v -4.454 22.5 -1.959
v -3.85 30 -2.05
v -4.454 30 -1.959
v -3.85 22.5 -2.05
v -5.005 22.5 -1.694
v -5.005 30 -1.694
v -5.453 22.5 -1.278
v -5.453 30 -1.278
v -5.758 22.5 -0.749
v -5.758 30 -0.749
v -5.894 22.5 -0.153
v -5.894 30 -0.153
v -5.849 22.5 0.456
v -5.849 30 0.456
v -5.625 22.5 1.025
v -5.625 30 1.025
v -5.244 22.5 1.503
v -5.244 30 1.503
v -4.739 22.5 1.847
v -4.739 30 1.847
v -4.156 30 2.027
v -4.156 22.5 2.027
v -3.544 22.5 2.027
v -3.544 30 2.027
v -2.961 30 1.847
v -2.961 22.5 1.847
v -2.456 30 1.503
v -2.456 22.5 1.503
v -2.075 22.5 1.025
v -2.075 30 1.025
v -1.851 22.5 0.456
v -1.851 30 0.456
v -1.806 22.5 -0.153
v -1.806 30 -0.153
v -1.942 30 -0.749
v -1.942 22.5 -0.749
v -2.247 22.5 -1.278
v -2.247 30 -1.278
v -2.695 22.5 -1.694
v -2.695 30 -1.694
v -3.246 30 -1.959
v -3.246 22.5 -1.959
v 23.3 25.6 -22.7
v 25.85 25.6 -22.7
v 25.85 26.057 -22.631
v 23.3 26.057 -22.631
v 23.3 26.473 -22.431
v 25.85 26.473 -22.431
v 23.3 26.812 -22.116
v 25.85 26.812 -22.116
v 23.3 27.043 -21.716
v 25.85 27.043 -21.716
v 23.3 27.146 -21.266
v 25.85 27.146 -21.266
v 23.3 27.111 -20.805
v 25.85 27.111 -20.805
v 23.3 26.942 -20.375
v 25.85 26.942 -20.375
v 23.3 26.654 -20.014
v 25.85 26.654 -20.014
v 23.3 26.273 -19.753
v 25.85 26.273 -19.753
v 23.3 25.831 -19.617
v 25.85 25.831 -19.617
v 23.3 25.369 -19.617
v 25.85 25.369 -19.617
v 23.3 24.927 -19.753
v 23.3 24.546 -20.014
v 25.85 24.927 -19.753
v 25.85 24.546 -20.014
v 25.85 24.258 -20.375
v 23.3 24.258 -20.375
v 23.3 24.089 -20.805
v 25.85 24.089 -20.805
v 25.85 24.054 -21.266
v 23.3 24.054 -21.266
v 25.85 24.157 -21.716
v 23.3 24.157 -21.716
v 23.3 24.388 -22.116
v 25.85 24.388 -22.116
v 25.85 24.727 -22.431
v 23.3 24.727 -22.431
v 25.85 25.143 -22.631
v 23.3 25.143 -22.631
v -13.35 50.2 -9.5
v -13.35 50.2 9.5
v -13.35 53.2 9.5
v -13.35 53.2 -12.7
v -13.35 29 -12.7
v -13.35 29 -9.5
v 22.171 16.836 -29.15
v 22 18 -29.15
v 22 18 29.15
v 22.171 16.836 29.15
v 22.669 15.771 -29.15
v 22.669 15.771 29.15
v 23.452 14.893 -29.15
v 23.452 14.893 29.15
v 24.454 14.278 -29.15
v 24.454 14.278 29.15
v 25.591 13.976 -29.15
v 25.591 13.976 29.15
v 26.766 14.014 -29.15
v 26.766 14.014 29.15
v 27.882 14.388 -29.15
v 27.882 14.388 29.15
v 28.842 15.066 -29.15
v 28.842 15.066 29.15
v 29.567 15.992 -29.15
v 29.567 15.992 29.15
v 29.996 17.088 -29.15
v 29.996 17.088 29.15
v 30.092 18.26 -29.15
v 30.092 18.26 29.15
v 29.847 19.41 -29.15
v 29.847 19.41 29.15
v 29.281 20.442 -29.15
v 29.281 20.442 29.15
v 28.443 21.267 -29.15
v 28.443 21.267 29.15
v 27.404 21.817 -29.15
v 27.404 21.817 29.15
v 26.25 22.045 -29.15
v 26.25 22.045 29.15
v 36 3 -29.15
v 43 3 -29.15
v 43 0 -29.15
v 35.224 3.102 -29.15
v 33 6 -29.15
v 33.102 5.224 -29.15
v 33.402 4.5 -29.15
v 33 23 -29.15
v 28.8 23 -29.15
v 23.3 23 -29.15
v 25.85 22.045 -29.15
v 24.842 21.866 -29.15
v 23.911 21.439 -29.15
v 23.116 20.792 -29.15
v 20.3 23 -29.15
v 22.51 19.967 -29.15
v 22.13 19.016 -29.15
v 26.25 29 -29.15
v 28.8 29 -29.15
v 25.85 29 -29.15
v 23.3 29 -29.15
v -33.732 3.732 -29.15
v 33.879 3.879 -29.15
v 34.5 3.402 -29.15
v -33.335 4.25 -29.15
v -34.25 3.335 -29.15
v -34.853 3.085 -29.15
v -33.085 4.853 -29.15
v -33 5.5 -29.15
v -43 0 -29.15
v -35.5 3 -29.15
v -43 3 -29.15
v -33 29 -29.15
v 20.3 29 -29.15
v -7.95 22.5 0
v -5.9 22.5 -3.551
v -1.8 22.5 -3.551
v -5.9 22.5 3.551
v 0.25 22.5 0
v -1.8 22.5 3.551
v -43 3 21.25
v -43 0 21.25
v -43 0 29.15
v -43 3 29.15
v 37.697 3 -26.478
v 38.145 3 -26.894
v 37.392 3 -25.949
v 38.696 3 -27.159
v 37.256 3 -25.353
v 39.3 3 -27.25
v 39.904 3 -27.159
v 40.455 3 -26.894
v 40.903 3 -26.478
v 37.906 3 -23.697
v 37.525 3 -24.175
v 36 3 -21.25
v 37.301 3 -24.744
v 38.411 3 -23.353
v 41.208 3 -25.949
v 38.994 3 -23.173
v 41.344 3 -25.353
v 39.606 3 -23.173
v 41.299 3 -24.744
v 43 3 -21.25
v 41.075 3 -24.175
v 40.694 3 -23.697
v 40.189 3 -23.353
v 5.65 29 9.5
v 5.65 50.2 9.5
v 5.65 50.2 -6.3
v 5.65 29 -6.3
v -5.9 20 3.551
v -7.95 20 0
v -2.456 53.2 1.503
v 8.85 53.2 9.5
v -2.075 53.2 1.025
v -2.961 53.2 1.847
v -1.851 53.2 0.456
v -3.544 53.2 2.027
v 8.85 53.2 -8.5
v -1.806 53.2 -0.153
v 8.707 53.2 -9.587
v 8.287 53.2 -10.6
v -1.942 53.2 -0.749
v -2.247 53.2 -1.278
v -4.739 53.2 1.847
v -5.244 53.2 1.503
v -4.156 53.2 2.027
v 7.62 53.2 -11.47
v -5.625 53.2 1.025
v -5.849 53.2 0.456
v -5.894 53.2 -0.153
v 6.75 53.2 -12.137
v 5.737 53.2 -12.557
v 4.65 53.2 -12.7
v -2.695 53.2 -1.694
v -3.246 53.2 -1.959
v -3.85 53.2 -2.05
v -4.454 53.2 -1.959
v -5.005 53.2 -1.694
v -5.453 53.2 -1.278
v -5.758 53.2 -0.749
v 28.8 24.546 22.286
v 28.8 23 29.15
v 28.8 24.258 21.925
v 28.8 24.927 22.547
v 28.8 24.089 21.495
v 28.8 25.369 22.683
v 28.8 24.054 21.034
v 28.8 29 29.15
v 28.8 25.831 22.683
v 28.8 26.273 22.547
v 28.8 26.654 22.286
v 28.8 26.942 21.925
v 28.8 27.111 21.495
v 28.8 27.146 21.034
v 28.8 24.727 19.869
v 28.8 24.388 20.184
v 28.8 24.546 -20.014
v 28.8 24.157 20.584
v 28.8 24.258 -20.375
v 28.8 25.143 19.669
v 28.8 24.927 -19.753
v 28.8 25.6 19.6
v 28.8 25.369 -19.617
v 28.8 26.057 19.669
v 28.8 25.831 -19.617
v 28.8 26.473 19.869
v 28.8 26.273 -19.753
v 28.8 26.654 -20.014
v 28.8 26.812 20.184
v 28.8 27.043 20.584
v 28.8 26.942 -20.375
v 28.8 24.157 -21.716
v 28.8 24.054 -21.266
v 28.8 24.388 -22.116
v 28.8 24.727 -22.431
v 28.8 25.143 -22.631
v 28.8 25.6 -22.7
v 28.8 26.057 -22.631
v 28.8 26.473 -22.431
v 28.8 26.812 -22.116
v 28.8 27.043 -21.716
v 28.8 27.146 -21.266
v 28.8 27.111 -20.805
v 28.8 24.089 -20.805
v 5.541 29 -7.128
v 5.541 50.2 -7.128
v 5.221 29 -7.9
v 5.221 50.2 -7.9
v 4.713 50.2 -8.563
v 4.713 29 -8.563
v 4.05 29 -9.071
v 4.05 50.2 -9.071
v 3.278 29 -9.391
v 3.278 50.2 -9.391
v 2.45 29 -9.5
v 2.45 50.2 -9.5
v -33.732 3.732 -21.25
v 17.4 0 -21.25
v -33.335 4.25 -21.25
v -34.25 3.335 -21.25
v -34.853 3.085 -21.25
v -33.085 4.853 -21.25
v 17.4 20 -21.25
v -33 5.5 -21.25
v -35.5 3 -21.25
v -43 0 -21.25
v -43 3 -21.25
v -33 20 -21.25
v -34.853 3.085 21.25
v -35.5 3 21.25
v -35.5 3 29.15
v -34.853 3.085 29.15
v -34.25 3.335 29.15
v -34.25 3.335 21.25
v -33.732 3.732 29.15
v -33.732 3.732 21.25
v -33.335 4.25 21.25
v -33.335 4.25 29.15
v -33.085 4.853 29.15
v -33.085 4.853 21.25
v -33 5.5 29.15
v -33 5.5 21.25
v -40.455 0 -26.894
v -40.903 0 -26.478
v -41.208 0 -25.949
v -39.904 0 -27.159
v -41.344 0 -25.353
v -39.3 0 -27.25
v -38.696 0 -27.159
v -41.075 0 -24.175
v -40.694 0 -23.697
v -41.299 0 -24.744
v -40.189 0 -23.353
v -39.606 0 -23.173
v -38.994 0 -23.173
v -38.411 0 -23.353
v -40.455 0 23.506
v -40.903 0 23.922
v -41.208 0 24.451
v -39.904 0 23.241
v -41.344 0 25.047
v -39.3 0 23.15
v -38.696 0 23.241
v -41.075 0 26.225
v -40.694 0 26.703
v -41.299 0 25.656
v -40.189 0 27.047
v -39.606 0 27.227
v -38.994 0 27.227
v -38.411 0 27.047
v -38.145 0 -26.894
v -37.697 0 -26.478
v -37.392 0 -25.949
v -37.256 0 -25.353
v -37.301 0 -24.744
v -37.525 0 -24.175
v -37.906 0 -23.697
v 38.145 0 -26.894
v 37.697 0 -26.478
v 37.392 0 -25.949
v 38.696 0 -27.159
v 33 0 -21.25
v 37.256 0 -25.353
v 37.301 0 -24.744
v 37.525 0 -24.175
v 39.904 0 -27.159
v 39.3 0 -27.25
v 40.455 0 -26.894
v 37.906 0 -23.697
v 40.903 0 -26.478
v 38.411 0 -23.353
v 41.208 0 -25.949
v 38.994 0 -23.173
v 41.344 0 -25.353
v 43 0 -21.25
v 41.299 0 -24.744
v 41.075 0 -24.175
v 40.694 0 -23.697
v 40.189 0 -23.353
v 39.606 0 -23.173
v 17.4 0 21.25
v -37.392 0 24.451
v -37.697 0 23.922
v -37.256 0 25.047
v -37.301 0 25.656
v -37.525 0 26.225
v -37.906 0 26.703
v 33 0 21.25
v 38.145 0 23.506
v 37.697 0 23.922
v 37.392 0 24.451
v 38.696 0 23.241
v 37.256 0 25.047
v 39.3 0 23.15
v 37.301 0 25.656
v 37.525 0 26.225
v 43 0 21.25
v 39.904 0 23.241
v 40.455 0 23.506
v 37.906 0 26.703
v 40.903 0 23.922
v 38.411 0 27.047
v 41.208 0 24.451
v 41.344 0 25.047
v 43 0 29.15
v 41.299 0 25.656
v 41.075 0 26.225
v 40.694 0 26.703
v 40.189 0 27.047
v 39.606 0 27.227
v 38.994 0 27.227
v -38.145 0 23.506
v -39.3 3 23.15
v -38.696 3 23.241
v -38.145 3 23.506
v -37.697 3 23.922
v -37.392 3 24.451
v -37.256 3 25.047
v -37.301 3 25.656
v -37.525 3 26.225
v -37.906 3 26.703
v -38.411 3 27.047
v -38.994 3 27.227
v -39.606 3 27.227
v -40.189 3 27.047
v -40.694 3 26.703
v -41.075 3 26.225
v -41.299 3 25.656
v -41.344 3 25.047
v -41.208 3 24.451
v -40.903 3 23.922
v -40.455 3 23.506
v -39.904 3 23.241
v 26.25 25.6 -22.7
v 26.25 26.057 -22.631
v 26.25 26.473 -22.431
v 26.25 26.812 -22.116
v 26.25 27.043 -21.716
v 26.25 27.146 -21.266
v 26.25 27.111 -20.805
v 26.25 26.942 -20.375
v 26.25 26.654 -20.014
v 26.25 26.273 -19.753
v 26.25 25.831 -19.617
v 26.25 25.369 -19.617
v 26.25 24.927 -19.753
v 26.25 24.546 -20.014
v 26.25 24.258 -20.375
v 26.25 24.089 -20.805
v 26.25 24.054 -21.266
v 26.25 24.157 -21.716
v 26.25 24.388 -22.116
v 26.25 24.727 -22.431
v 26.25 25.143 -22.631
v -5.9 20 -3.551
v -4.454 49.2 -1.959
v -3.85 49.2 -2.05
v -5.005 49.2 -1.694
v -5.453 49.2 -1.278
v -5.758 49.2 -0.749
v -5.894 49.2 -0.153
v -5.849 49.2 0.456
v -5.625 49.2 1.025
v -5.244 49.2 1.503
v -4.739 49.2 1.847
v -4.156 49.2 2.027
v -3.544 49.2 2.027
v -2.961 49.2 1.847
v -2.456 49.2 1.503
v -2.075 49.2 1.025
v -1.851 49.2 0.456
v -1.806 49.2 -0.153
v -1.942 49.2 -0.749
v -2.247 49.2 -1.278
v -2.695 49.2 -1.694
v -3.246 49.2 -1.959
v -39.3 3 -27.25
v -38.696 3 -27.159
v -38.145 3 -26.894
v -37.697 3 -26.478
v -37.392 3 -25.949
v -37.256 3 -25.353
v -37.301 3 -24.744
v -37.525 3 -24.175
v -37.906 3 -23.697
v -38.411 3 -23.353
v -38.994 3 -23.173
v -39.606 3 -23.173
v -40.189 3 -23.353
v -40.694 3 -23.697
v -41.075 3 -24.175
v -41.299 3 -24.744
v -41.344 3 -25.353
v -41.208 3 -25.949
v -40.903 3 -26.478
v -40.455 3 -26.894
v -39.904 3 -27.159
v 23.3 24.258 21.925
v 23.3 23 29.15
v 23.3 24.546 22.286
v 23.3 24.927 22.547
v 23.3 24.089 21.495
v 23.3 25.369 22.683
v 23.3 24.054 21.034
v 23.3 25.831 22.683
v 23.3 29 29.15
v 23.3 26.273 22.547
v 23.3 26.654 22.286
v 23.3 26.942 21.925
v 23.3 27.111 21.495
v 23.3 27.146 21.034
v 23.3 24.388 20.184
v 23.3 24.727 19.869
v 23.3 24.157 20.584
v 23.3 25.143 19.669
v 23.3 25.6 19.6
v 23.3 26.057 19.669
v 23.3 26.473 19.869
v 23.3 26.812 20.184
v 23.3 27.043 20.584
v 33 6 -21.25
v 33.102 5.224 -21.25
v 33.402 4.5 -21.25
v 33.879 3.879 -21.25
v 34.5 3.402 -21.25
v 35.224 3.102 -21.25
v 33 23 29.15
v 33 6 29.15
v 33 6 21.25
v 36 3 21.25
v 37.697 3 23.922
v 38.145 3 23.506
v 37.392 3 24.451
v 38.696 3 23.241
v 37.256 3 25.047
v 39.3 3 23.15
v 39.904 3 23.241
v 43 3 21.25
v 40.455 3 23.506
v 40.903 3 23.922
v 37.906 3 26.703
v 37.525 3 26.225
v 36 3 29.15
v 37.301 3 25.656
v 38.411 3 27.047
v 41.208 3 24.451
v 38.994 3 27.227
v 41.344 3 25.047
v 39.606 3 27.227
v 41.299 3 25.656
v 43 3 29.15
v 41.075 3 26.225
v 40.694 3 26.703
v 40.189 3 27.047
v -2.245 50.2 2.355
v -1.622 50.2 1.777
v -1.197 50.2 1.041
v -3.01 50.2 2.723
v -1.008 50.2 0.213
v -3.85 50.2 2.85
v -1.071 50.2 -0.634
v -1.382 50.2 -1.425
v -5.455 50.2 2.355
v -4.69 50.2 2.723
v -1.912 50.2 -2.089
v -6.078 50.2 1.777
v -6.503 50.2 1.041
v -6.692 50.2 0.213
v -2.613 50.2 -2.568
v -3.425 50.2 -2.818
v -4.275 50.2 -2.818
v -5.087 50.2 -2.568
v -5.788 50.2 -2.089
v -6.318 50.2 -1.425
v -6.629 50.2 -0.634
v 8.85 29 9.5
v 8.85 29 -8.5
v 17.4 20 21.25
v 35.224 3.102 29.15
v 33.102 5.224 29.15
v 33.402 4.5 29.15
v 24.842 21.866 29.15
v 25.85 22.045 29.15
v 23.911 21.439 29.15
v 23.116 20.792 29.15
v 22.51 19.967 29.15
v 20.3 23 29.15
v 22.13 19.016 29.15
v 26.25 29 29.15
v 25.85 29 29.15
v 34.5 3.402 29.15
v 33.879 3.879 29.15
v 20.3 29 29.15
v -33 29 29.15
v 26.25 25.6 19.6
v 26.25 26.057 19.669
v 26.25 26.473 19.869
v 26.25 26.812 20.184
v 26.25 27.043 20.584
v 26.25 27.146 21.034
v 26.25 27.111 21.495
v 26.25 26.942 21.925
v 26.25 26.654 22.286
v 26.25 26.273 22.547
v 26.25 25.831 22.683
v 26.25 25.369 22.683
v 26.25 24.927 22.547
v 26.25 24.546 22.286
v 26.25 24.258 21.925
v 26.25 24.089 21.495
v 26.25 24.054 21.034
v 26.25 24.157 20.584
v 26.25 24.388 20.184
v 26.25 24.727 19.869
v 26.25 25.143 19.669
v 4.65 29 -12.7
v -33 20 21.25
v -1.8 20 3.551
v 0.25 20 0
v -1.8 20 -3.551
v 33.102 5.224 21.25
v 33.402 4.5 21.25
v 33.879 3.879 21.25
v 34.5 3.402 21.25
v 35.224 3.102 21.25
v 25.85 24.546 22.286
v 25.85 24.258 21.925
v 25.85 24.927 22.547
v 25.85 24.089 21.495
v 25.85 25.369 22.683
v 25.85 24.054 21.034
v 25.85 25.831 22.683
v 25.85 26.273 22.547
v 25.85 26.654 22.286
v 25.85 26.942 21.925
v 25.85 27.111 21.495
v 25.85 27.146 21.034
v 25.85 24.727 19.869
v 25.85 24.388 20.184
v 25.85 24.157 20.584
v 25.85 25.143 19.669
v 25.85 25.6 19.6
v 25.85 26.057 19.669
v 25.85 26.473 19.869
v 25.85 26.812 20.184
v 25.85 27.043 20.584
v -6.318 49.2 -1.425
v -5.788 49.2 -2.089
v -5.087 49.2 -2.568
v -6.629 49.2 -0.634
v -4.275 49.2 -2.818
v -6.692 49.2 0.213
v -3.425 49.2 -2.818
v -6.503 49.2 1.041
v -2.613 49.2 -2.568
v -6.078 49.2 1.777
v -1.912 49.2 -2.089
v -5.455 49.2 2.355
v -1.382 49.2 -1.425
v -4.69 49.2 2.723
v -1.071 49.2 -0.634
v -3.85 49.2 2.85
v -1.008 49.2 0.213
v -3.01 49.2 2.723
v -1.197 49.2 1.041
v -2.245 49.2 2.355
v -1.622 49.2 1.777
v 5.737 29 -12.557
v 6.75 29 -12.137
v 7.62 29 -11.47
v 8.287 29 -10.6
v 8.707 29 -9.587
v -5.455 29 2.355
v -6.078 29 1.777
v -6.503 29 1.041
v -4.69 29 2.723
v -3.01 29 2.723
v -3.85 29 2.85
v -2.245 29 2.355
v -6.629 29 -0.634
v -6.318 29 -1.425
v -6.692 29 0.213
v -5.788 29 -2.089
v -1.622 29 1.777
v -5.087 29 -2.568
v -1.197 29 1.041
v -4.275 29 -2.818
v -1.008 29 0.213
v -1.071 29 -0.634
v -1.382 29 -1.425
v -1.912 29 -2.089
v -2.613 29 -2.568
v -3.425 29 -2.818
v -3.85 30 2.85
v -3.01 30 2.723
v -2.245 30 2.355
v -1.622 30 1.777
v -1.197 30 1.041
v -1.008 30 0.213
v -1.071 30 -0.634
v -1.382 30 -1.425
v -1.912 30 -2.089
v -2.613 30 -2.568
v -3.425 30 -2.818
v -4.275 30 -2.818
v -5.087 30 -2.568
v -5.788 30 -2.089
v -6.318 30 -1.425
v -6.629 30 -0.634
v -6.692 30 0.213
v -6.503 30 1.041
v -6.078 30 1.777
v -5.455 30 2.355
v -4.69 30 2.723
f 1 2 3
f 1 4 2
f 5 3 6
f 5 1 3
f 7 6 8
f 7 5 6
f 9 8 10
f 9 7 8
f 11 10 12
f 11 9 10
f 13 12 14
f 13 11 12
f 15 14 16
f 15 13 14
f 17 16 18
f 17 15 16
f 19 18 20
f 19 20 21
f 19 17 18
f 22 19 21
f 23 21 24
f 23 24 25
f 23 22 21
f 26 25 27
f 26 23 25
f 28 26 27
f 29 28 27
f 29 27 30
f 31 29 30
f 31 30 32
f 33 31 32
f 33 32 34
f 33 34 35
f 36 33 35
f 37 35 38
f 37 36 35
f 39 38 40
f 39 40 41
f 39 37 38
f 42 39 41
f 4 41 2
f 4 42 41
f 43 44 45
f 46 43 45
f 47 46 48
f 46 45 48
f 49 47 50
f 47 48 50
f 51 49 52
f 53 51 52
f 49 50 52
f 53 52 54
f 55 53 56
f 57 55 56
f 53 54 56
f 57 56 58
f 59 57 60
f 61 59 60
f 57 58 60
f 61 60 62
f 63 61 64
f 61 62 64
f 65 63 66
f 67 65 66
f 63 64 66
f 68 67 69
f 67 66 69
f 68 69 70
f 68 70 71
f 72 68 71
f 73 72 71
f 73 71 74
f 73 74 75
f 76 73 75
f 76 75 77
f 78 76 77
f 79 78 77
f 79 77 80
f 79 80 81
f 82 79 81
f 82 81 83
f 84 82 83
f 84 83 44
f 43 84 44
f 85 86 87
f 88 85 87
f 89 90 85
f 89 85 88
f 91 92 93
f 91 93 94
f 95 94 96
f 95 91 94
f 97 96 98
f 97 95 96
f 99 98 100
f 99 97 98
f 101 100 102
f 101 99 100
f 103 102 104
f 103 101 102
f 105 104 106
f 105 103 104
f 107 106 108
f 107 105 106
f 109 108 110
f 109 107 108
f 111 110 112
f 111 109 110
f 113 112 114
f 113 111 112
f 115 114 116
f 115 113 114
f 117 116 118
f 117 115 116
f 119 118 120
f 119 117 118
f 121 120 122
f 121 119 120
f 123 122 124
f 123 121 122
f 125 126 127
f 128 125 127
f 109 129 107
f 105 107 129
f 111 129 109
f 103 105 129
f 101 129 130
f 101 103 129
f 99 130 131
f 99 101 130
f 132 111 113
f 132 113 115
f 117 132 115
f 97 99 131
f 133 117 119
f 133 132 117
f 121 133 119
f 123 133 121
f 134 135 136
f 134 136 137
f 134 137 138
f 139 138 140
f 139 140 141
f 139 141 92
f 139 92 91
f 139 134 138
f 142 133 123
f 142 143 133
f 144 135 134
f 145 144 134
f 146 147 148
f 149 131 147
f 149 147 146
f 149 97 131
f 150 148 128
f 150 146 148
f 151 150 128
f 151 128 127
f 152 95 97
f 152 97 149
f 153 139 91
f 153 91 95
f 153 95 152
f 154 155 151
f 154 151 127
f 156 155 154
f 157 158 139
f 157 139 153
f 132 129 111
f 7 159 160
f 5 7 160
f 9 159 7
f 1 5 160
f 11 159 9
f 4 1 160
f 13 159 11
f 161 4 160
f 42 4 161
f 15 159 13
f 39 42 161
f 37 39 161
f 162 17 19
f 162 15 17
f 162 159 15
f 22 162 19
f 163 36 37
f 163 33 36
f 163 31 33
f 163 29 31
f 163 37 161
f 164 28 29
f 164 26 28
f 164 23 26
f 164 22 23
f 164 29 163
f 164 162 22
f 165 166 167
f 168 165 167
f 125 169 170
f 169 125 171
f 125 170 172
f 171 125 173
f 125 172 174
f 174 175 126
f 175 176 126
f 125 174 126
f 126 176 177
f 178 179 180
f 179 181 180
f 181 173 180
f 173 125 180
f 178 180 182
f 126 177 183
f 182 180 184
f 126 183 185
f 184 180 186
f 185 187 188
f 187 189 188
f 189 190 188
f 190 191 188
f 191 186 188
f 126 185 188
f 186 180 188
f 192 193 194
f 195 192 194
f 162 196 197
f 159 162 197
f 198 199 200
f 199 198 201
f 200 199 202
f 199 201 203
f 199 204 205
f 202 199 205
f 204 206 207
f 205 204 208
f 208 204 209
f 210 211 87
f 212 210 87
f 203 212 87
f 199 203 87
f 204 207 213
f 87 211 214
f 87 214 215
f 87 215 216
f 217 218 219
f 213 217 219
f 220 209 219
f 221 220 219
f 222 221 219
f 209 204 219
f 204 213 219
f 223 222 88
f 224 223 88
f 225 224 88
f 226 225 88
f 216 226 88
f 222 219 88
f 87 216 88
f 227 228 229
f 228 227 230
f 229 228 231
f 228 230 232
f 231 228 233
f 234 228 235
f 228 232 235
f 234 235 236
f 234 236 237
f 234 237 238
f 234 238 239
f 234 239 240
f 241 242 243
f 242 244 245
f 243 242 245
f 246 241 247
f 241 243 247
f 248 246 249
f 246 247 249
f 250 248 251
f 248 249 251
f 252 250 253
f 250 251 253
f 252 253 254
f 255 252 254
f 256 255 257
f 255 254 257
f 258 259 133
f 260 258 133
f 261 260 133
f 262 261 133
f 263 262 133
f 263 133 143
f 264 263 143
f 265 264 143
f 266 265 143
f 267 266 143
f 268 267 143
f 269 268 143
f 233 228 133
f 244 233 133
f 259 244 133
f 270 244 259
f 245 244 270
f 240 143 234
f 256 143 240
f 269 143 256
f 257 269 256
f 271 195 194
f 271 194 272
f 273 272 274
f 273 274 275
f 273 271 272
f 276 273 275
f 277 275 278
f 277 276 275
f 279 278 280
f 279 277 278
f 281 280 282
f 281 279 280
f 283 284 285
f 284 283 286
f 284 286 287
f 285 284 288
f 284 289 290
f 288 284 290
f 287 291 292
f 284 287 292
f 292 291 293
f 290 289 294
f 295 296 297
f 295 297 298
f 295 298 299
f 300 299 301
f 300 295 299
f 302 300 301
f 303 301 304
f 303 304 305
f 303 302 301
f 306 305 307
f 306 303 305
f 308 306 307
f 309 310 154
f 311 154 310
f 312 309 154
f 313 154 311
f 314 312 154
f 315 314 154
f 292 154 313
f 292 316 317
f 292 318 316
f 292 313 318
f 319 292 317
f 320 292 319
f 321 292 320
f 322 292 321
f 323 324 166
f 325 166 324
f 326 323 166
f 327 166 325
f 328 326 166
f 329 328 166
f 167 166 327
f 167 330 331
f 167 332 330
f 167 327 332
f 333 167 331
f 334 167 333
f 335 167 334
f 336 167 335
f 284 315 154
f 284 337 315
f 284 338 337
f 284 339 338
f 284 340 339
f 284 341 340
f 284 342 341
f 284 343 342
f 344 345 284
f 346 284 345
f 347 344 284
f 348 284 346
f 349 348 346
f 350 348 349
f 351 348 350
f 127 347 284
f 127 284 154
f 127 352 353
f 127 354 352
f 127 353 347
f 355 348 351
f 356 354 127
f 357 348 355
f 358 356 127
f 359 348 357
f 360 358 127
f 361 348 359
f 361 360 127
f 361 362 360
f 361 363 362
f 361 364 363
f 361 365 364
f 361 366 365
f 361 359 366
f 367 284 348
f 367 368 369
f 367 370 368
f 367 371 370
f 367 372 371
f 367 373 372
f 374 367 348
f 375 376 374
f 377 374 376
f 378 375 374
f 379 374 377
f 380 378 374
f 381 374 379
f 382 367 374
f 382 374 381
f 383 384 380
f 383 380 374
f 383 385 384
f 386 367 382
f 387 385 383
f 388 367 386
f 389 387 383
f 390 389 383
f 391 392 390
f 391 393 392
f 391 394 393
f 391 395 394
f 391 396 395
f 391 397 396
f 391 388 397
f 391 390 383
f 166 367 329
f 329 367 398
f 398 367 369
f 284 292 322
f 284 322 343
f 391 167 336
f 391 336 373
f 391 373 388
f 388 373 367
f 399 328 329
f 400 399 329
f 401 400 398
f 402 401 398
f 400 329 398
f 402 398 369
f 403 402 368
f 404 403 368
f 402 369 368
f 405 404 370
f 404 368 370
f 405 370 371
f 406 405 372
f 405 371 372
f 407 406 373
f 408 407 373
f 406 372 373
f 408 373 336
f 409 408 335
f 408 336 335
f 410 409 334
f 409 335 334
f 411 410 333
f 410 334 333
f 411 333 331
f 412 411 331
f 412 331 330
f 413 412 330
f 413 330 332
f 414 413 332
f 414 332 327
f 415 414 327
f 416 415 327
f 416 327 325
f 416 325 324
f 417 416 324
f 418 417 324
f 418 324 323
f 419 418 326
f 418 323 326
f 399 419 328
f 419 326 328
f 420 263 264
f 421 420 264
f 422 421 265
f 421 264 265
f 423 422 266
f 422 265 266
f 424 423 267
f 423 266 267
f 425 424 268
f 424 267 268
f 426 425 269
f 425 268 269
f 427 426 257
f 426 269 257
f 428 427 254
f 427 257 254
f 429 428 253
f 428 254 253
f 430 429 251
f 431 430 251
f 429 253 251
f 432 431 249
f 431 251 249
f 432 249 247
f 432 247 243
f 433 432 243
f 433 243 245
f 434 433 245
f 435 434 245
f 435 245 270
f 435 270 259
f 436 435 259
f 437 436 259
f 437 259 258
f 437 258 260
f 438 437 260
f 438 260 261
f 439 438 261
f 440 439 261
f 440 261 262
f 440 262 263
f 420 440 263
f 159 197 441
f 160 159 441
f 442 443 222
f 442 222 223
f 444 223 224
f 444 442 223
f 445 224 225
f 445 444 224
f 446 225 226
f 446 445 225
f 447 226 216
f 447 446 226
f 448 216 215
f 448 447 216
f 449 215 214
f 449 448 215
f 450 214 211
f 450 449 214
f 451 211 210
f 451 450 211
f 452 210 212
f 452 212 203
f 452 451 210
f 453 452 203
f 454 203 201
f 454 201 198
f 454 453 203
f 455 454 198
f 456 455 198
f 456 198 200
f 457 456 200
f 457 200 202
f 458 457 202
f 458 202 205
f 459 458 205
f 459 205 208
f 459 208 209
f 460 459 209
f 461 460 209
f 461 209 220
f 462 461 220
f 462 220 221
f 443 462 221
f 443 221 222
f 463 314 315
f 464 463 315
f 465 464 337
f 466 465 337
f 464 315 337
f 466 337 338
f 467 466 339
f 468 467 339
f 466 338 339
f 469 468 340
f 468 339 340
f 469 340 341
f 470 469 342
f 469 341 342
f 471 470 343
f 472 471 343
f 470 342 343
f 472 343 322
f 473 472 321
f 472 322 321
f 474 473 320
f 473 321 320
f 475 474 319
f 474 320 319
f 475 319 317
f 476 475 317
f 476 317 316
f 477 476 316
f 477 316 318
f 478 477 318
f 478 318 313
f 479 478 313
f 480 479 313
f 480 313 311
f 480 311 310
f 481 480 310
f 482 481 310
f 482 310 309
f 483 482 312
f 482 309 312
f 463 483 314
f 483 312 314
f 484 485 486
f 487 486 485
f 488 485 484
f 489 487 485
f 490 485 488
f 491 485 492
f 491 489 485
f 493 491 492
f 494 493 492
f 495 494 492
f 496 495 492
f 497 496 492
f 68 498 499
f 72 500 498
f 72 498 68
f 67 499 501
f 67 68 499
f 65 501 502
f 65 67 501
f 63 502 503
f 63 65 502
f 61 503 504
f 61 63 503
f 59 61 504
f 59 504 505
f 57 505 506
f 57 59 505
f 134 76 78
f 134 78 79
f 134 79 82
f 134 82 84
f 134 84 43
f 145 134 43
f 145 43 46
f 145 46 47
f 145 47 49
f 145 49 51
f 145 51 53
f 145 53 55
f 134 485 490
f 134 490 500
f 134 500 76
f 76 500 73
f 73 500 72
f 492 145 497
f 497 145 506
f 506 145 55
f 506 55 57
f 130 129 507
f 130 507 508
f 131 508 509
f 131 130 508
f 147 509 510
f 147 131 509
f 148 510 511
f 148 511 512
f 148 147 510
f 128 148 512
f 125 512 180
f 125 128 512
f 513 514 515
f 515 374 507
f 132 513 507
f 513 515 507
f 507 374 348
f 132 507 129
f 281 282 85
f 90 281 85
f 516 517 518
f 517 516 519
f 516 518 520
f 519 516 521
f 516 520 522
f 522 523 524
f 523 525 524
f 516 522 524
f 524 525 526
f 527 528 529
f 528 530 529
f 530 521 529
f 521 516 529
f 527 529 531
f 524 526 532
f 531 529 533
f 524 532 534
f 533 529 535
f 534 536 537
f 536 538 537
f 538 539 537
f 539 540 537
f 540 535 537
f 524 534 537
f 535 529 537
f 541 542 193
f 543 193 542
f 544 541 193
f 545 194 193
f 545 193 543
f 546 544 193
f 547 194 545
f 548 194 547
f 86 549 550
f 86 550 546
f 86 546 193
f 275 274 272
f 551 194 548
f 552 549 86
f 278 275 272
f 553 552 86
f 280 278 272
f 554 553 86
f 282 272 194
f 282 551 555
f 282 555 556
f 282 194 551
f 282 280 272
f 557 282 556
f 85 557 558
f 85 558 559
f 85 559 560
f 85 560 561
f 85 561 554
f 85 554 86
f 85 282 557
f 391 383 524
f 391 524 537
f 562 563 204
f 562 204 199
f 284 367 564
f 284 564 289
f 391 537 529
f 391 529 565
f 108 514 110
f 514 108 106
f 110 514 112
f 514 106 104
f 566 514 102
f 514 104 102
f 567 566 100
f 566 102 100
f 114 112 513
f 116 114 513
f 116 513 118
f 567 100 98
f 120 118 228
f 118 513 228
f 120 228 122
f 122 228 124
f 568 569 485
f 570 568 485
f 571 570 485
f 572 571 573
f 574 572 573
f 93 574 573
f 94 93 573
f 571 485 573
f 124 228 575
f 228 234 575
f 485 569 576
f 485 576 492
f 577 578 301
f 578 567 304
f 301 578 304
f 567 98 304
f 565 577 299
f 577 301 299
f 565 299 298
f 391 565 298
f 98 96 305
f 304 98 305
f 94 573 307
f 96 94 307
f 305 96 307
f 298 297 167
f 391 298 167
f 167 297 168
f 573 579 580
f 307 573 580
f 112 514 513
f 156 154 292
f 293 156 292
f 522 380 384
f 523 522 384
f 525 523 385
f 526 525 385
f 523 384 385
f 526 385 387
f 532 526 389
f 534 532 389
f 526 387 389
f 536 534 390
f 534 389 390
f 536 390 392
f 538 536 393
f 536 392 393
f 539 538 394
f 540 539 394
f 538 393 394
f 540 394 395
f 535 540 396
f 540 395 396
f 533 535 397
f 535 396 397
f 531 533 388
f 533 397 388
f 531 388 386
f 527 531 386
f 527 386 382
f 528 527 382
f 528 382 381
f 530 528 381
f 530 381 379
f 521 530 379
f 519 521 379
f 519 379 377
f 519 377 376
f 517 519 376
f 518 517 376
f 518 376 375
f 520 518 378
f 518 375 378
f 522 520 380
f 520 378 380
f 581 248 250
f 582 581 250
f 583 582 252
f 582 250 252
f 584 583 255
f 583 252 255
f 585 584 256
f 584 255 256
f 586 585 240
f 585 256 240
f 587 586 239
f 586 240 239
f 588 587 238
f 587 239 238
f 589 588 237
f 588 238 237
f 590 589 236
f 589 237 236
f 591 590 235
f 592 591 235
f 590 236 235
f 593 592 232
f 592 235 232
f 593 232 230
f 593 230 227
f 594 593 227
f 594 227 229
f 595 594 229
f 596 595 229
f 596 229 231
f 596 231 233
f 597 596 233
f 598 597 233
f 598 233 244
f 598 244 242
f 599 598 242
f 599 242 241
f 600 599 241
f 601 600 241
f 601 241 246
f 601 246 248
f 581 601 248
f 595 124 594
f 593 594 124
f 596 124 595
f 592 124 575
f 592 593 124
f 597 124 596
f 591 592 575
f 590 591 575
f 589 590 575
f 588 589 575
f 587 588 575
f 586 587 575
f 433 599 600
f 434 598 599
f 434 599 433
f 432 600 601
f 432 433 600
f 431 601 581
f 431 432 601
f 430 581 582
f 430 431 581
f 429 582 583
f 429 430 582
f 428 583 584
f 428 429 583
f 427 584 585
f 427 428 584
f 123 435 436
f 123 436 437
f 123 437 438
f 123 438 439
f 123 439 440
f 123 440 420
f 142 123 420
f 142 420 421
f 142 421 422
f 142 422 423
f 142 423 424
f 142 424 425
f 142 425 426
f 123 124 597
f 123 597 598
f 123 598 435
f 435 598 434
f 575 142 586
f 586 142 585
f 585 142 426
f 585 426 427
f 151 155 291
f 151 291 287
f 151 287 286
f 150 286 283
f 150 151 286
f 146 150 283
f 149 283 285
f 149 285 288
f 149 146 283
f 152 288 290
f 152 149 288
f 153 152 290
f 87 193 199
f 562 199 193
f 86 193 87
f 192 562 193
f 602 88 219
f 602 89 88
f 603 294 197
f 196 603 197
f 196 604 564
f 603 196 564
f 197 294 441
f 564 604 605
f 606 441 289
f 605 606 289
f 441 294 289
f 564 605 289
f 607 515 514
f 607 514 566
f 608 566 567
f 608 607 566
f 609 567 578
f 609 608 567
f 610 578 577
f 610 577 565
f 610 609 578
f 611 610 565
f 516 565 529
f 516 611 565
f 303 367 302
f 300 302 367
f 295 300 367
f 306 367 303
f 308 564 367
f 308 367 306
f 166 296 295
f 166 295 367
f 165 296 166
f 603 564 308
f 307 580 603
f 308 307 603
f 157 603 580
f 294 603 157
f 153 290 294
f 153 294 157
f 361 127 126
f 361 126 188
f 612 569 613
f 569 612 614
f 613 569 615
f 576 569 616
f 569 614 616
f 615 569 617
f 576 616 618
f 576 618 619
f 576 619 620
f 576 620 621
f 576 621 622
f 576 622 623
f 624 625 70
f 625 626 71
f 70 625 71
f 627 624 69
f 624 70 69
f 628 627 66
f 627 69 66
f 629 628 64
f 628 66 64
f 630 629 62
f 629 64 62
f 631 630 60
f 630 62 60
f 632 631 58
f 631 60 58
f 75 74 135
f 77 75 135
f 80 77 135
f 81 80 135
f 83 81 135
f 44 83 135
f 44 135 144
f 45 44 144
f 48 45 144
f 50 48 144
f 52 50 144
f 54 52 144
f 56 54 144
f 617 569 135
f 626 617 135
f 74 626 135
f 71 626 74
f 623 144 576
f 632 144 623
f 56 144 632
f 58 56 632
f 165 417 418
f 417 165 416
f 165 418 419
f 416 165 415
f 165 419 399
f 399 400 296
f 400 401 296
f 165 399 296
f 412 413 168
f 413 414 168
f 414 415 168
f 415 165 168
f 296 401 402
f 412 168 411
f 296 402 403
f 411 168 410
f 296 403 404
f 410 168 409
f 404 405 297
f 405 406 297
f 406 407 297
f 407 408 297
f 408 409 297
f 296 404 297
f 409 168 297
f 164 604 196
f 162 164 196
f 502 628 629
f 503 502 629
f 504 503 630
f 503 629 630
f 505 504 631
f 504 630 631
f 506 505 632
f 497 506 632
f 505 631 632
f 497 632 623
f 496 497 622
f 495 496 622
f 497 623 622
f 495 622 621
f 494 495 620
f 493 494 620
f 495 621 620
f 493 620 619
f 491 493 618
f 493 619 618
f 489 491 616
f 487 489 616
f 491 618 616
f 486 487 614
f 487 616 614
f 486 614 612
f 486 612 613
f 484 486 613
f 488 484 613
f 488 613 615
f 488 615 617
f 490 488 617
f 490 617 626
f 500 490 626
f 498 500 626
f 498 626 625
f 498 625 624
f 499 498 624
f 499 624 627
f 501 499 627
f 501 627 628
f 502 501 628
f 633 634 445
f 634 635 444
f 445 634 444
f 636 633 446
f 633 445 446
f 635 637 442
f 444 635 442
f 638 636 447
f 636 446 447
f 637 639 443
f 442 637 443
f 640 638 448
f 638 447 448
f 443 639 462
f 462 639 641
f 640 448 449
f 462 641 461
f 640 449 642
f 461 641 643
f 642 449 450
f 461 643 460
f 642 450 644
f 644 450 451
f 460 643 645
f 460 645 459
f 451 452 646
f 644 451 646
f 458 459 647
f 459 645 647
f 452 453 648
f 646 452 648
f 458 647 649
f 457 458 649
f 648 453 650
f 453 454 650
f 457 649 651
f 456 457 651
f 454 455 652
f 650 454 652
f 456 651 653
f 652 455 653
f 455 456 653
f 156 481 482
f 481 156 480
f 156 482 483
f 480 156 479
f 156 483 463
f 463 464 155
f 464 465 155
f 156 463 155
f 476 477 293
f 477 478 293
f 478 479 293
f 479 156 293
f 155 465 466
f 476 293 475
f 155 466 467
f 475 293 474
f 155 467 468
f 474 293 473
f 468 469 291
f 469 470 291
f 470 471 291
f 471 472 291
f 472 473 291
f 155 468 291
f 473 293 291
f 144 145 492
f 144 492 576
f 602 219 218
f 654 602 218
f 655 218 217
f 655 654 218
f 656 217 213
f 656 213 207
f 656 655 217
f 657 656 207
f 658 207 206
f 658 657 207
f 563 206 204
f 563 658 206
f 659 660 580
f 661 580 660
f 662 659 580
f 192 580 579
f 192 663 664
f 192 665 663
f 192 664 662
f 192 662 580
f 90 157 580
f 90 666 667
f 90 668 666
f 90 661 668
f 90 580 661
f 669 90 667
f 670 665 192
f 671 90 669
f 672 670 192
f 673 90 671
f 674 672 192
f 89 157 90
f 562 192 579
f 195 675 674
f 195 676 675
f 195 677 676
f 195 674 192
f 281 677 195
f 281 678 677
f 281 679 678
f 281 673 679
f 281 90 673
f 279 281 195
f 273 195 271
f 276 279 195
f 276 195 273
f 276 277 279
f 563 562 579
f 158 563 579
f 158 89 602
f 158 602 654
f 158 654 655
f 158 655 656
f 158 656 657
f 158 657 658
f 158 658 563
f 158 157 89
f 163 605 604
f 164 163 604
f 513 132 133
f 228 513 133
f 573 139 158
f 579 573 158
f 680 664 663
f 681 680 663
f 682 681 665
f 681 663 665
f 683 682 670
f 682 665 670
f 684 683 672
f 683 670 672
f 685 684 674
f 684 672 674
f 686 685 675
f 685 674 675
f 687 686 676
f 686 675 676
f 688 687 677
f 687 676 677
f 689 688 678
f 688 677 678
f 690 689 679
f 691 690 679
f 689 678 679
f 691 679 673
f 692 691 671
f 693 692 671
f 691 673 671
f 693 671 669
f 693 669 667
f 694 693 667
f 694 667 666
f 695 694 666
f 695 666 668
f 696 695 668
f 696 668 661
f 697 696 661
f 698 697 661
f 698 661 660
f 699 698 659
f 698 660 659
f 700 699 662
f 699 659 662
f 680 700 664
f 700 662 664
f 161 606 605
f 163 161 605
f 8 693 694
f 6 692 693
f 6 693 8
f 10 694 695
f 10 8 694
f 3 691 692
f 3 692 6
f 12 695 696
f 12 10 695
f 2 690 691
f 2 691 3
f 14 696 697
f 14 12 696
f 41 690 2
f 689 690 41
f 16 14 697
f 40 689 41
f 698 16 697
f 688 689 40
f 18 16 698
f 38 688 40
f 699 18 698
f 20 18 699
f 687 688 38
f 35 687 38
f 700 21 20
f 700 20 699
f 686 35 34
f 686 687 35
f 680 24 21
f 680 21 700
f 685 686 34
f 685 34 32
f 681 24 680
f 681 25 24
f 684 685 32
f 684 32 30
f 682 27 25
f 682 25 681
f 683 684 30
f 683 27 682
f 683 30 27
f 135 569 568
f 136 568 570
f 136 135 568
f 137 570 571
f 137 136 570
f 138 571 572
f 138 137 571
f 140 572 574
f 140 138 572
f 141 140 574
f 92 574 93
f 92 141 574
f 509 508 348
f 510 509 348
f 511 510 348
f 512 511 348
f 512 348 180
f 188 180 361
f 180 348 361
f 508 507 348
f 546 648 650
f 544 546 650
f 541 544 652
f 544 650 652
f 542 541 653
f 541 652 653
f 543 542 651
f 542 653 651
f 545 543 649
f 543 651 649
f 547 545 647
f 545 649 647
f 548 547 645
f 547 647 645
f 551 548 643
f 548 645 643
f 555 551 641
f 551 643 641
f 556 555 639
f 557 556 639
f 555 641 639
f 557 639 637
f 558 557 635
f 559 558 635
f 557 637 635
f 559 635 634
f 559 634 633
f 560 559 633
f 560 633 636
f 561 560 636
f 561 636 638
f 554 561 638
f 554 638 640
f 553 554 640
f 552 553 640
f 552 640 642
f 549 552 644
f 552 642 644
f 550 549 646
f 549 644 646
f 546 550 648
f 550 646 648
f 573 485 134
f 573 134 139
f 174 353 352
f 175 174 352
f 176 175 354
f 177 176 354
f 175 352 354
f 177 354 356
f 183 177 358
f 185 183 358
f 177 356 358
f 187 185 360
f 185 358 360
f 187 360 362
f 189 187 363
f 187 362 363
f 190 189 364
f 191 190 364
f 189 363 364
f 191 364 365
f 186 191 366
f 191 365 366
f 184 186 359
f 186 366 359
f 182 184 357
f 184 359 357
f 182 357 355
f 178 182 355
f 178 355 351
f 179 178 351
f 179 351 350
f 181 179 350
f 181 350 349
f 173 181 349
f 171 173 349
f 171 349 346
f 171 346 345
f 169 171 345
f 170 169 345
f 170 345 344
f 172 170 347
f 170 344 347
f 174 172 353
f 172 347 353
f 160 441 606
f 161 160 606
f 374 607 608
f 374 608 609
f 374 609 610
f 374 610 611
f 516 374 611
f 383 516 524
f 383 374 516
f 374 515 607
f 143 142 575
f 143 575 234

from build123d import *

# Parameters (mm, degrees)
SKETCH1_W           = 66
SKETCH1_H           = 58.3
SKETCH1_R           = 2.05
BOSS_EXTRUDE1_DEPTH = 29
CUT_EXTRUDE1_START  = -29
CUT_EXTRUDE1_DEPTH  = 20
SKETCH6_W           = 10
SKETCH6_H           = 7.9
SKETCH6_R           = 2.05
BOSS_EXTRUDE2_DEPTH = 3
BOSS_EXTRUDE4_DEPTH = 7.9
BOSS_EXTRUDE5_START = -50.4
BOSS_EXTRUDE5_DEPTH = 7.9
CUT_EXTRUDE4_START  = -58.3
SKETCH8_R           = 4.05
CUT_EXTRUDE4_DEPTH  = 58.3
CUT_EXTRUDE5_REACH  = 80.031
SKETCH10_W          = 3
SKETCH10_H          = 6
SKETCH10_W_2        = 4.2
SKETCH10_W_3        = 0.4
SKETCH10_H_2        = 7.617508416
CUT_EXTRUDE6_REACH  = 84.74
SKETCH11_R          = 1.55
CUT_EXTRUDE7_DEPTH  = 2.5
BOSS_EXTRUDE6_DEPTH = 21.2
SKETCH14_R          = 2.05
BOSS_EXTRUDE7_DEPTH = 3
BOSS_EXTRUDE8_START = -4
SKETCH15_R          = 2.85
SKETCH15_R_2        = 2.05
BOSS_EXTRUDE8_DEPTH = 1
BOSS_EXTRUDE9_START = -24.2
SKETCH15_2_R        = 2.85
SKETCH15_2_R_2      = 2.05
BOSS_EXTRUDE9_DEPTH = 1


with BuildPart() as part:
    # Sketch1 → Boss-Extrude1 (new body)
    with BuildSketch(Plane(origin=(0, 0, 0), x_dir=(1, 0, 0), z_dir=(0, 1, 0))):
        Rectangle(SKETCH1_W, SKETCH1_H)
        with Locations(Location((-3.85, 0, 0), (0, 0, 90))):
            Circle(SKETCH1_R, mode=Mode.SUBTRACT)
    extrude(amount=BOSS_EXTRUDE1_DEPTH)

    # Sketch3 → Cut-Extrude1 (cut)
    with BuildSketch(Plane(origin=(0, 29, 0), x_dir=(1, 0, 0), z_dir=(0, 1, 0)).offset(CUT_EXTRUDE1_START)):
        Polygon((-33, 21.25), (-33, -21.25), (17.4, -21.25), (17.4, 21.25), (-25.1, 21.25), align=None)
    extrude(amount=CUT_EXTRUDE1_DEPTH, mode=Mode.SUBTRACT)

    # Sketch6 → Boss-Extrude2 (add)
    # profile 1 of 4: a face of its own
    with BuildSketch(Plane.XZ):
        with Locations((-38, 25.2)):
            Rectangle(SKETCH6_W, SKETCH6_H)
        with Locations(Location((-39.3, 25.2, 0), (0, 0, 270))):
            Circle(SKETCH6_R, mode=Mode.SUBTRACT)
    # profile 2 of 4: a face of its own
    with BuildSketch(Plane.XZ):
        with Locations((-38, -25.2)):
            Rectangle(SKETCH6_W, SKETCH6_H)
        with Locations(Location((-39.3, -25.2, 0), (0, 0, 270))):
            Circle(SKETCH6_R, mode=Mode.SUBTRACT)
    # profile 3 of 4: a face of its own
    with BuildSketch(Plane.XZ):
        with Locations((38, 25.2)):
            Rectangle(SKETCH6_W, SKETCH6_H)
        with Locations(Location((39.3, 25.2, 0), (0, 0, 270))):
            Circle(SKETCH6_R, mode=Mode.SUBTRACT)
    # profile 4 of 4: a face of its own
    with BuildSketch(Plane.XZ):
        with Locations((38, -25.2)):
            Rectangle(SKETCH6_W, SKETCH6_H)
        with Locations(Location((39.3, -25.2, 0), (0, 0, 270))):
            Circle(SKETCH6_R, mode=Mode.SUBTRACT)
    extrude(amount=-BOSS_EXTRUDE2_DEPTH)

    # Sketch7 → Boss-Extrude4 (add)
    with BuildSketch(Plane(origin=(0, 0, -29.15), x_dir=(-1, 0, 0), z_dir=(0, 0, -1))):
        with BuildLine():
            ThreePointArc((35.5, 3), (33.732233047, 3.732233047), (33, 5.5))
            Line((33, 5.5), (33, 3))
            Line((33, 3), (35.5, 3))
        make_face()
        with BuildLine():
            ThreePointArc((-33, 6), (-33.878679656, 3.878679656), (-36, 3))
            Line((-36, 3), (-33, 3))
            Line((-33, 3), (-33, 6))
        make_face()
    extrude(amount=-BOSS_EXTRUDE4_DEPTH)

    # Sketch7<5> → Boss-Extrude5 (add)
    with BuildSketch(Plane(origin=(0, 0, -29.15), x_dir=(-1, 0, 0), z_dir=(0, 0, -1)).offset(BOSS_EXTRUDE5_START)):
        with BuildLine():
            ThreePointArc((35.5, 3), (33.732233047, 3.732233047), (33, 5.5))
            Line((33, 5.5), (33, 3))
            Line((33, 3), (35.5, 3))
        make_face()
        with BuildLine():
            ThreePointArc((-33, 6), (-33.878679656, 3.878679656), (-36, 3))
            Line((-36, 3), (-33, 3))
            Line((-33, 3), (-33, 6))
        make_face()
    extrude(amount=-BOSS_EXTRUDE5_DEPTH)

    # Sketch8 → Cut-Extrude4 (cut)
    with BuildSketch(Plane.XY.offset(29.15).offset(CUT_EXTRUDE4_START)):
        with Locations(Location((26.05, 18, 0), (0, 0, 180))):
            Circle(SKETCH8_R)
    extrude(amount=CUT_EXTRUDE4_DEPTH, mode=Mode.SUBTRACT)

    # Sketch10 → Cut-Extrude5 (cut, up to next)
    with BuildSketch(Plane(origin=(0, 0, -29.15), x_dir=(-1, 0, 0), z_dir=(0, 0, -1)), mode=Mode.PRIVATE) as cut_extrude5_sk1:
        with Locations((-21.8, 26)):
            Rectangle(SKETCH10_W, SKETCH10_H)
    cut_extrude5_tool1 = extrude(cut_extrude5_sk1.sketch, amount=-CUT_EXTRUDE5_REACH, mode=Mode.PRIVATE) & part.part
    # Sketch10 → Cut-Extrude5 (cut, up to next)
    with BuildSketch(Plane(origin=(0, 0, -29.15), x_dir=(-1, 0, 0), z_dir=(0, 0, -1)), mode=Mode.PRIVATE) as cut_extrude5_sk2:
        with Locations((-30.9, 26)):
            Rectangle(SKETCH10_W_2, SKETCH10_H)
    cut_extrude5_tool2 = extrude(cut_extrude5_sk2.sketch, amount=-CUT_EXTRUDE5_REACH, mode=Mode.PRIVATE) & part.part
    # Sketch10 → Cut-Extrude5 (cut, up to next)
    with BuildSketch(Plane(origin=(0, 0, -29.15), x_dir=(-1, 0, 0), z_dir=(0, 0, -1)), mode=Mode.PRIVATE) as cut_extrude5_sk3:
        with Locations((-26.05, 25.191245792)):
            Rectangle(SKETCH10_W_3, SKETCH10_H_2)
    cut_extrude5_tool3 = extrude(cut_extrude5_sk3.sketch, amount=-CUT_EXTRUDE5_REACH, mode=Mode.PRIVATE) & part.part
    add(cut_extrude5_tool1.solids().sort_by_distance((21.8, 26, -29.15))[0], mode=Mode.SUBTRACT)
    add(cut_extrude5_tool2.solids().sort_by_distance((30.9, 26, -29.15))[0], mode=Mode.SUBTRACT)
    add(cut_extrude5_tool3.solids().sort_by_distance((26.05, 25.191246, -29.15))[0], mode=Mode.SUBTRACT)

    # Cut-Extrude6: up to this face of the body (flat: up to its plane)
    cut_extrude6_end = Plane(part.part.faces().sort_by_distance((23.3, 26, 0))[0])
    # Sketch11 → Cut-Extrude6 (cut, up to the picked face)
    with BuildSketch(Plane(origin=(28.8, 0, 0), x_dir=(0, 0, -1), z_dir=(1, 0, 0)), mode=Mode.PRIVATE) as cut_extrude6_sk1:
        with Locations((-21.15, 25.6)):
            Circle(SKETCH11_R)
    cut_extrude6_tool1 = split(extrude(cut_extrude6_sk1.sketch, amount=-CUT_EXTRUDE6_REACH, mode=Mode.PRIVATE), bisect_by=cut_extrude6_end, keep=Keep.BOTH, mode=Mode.PRIVATE)
    # Sketch11 → Cut-Extrude6 (cut, up to the picked face)
    with BuildSketch(Plane(origin=(28.8, 0, 0), x_dir=(0, 0, -1), z_dir=(1, 0, 0)), mode=Mode.PRIVATE) as cut_extrude6_sk2:
        with Locations((21.15, 25.6)):
            Circle(SKETCH11_R)
    cut_extrude6_tool2 = split(extrude(cut_extrude6_sk2.sketch, amount=-CUT_EXTRUDE6_REACH, mode=Mode.PRIVATE), bisect_by=cut_extrude6_end, keep=Keep.BOTH, mode=Mode.PRIVATE)
    add(cut_extrude6_tool1.solids().sort_by(Axis((28.8, 25.6, 21.15), (-1, 0, 0)))[0], mode=Mode.SUBTRACT)
    add(cut_extrude6_tool2.solids().sort_by(Axis((28.8, 25.6, -21.15), (-1, 0, 0)))[0], mode=Mode.SUBTRACT)

    # Sketch12 → Cut-Extrude7 (cut)
    with BuildSketch(Plane.XZ.offset(-20)):
        Polygon((-7.95, 0), (-5.9, -3.550704156), (-1.8, -3.550704156), (0.25, 0), (-1.8, 3.550704156), (-5.9, 3.550704156), align=None)
    extrude(amount=-CUT_EXTRUDE7_DEPTH, mode=Mode.SUBTRACT)

    # Sketch13 → Boss-Extrude6 (add)
    with BuildSketch(Plane(origin=(0, 29, 0), x_dir=(1, 0, 0), z_dir=(0, 1, 0))):
        with BuildLine():
            Line((-13.35, 9.5), (-13.35, 12.7))
            Line((-13.35, 12.7), (4.65, 12.7))
            ThreePointArc((4.65, 12.7), (7.619848481, 11.469848481), (8.85, 8.5))
            Line((8.85, 8.5), (8.85, -9.5))
            Line((8.85, -9.5), (5.65, -9.5))
            Line((5.65, -9.5), (5.65, 6.3))
            ThreePointArc((5.65, 6.3), (4.7127417, 8.5627417), (2.45, 9.5))
            Line((2.45, 9.5), (-13.35, 9.5))
        make_face()
    extrude(amount=BOSS_EXTRUDE6_DEPTH)

    # Sketch14 → Boss-Extrude7 (add)
    with BuildSketch(Plane(origin=(0, 50.2, 0), x_dir=(1, 0, 0), z_dir=(0, 1, 0))):
        with BuildLine():
            Line((-13.35, 12.7), (4.65, 12.7))
            ThreePointArc((4.65, 12.7), (7.619848481, 11.469848481), (8.85, 8.5))
            Line((8.85, 8.5), (8.85, -9.5))
            Line((8.85, -9.5), (-13.35, -9.5))
            Line((-13.35, -9.5), (-13.35, 12.7))
        make_face()
        with Locations(Location((-3.85, 0, 0), (0, 0, 90))):
            Circle(SKETCH14_R, mode=Mode.SUBTRACT)
    extrude(amount=BOSS_EXTRUDE7_DEPTH)

    # Sketch15 → Boss-Extrude8 (add)
    with BuildSketch(Plane(origin=(0, 53.2, 0), x_dir=(1, 0, 0), z_dir=(0, 1, 0)).offset(BOSS_EXTRUDE8_START)):
        with Locations(Location((-3.85, 0, 0), (0, 0, 270))):
            Circle(SKETCH15_R)
        with Locations(Location((-3.85, 0, 0), (0, 0, 90))):
            Circle(SKETCH15_R_2, mode=Mode.SUBTRACT)
    extrude(amount=BOSS_EXTRUDE8_DEPTH)

    # Sketch15<2> → Boss-Extrude9 (add)
    with BuildSketch(Plane(origin=(0, 53.2, 0), x_dir=(1, 0, 0), z_dir=(0, 1, 0)).offset(BOSS_EXTRUDE9_START)):
        with Locations(Location((-3.85, 0, 0), (0, 0, 270))):
            Circle(SKETCH15_2_R)
        with Locations(Location((-3.85, 0, 0), (0, 0, 90))):
            Circle(SKETCH15_2_R_2, mode=Mode.SUBTRACT)
    extrude(amount=BOSS_EXTRUDE9_DEPTH)


solid = part.part
